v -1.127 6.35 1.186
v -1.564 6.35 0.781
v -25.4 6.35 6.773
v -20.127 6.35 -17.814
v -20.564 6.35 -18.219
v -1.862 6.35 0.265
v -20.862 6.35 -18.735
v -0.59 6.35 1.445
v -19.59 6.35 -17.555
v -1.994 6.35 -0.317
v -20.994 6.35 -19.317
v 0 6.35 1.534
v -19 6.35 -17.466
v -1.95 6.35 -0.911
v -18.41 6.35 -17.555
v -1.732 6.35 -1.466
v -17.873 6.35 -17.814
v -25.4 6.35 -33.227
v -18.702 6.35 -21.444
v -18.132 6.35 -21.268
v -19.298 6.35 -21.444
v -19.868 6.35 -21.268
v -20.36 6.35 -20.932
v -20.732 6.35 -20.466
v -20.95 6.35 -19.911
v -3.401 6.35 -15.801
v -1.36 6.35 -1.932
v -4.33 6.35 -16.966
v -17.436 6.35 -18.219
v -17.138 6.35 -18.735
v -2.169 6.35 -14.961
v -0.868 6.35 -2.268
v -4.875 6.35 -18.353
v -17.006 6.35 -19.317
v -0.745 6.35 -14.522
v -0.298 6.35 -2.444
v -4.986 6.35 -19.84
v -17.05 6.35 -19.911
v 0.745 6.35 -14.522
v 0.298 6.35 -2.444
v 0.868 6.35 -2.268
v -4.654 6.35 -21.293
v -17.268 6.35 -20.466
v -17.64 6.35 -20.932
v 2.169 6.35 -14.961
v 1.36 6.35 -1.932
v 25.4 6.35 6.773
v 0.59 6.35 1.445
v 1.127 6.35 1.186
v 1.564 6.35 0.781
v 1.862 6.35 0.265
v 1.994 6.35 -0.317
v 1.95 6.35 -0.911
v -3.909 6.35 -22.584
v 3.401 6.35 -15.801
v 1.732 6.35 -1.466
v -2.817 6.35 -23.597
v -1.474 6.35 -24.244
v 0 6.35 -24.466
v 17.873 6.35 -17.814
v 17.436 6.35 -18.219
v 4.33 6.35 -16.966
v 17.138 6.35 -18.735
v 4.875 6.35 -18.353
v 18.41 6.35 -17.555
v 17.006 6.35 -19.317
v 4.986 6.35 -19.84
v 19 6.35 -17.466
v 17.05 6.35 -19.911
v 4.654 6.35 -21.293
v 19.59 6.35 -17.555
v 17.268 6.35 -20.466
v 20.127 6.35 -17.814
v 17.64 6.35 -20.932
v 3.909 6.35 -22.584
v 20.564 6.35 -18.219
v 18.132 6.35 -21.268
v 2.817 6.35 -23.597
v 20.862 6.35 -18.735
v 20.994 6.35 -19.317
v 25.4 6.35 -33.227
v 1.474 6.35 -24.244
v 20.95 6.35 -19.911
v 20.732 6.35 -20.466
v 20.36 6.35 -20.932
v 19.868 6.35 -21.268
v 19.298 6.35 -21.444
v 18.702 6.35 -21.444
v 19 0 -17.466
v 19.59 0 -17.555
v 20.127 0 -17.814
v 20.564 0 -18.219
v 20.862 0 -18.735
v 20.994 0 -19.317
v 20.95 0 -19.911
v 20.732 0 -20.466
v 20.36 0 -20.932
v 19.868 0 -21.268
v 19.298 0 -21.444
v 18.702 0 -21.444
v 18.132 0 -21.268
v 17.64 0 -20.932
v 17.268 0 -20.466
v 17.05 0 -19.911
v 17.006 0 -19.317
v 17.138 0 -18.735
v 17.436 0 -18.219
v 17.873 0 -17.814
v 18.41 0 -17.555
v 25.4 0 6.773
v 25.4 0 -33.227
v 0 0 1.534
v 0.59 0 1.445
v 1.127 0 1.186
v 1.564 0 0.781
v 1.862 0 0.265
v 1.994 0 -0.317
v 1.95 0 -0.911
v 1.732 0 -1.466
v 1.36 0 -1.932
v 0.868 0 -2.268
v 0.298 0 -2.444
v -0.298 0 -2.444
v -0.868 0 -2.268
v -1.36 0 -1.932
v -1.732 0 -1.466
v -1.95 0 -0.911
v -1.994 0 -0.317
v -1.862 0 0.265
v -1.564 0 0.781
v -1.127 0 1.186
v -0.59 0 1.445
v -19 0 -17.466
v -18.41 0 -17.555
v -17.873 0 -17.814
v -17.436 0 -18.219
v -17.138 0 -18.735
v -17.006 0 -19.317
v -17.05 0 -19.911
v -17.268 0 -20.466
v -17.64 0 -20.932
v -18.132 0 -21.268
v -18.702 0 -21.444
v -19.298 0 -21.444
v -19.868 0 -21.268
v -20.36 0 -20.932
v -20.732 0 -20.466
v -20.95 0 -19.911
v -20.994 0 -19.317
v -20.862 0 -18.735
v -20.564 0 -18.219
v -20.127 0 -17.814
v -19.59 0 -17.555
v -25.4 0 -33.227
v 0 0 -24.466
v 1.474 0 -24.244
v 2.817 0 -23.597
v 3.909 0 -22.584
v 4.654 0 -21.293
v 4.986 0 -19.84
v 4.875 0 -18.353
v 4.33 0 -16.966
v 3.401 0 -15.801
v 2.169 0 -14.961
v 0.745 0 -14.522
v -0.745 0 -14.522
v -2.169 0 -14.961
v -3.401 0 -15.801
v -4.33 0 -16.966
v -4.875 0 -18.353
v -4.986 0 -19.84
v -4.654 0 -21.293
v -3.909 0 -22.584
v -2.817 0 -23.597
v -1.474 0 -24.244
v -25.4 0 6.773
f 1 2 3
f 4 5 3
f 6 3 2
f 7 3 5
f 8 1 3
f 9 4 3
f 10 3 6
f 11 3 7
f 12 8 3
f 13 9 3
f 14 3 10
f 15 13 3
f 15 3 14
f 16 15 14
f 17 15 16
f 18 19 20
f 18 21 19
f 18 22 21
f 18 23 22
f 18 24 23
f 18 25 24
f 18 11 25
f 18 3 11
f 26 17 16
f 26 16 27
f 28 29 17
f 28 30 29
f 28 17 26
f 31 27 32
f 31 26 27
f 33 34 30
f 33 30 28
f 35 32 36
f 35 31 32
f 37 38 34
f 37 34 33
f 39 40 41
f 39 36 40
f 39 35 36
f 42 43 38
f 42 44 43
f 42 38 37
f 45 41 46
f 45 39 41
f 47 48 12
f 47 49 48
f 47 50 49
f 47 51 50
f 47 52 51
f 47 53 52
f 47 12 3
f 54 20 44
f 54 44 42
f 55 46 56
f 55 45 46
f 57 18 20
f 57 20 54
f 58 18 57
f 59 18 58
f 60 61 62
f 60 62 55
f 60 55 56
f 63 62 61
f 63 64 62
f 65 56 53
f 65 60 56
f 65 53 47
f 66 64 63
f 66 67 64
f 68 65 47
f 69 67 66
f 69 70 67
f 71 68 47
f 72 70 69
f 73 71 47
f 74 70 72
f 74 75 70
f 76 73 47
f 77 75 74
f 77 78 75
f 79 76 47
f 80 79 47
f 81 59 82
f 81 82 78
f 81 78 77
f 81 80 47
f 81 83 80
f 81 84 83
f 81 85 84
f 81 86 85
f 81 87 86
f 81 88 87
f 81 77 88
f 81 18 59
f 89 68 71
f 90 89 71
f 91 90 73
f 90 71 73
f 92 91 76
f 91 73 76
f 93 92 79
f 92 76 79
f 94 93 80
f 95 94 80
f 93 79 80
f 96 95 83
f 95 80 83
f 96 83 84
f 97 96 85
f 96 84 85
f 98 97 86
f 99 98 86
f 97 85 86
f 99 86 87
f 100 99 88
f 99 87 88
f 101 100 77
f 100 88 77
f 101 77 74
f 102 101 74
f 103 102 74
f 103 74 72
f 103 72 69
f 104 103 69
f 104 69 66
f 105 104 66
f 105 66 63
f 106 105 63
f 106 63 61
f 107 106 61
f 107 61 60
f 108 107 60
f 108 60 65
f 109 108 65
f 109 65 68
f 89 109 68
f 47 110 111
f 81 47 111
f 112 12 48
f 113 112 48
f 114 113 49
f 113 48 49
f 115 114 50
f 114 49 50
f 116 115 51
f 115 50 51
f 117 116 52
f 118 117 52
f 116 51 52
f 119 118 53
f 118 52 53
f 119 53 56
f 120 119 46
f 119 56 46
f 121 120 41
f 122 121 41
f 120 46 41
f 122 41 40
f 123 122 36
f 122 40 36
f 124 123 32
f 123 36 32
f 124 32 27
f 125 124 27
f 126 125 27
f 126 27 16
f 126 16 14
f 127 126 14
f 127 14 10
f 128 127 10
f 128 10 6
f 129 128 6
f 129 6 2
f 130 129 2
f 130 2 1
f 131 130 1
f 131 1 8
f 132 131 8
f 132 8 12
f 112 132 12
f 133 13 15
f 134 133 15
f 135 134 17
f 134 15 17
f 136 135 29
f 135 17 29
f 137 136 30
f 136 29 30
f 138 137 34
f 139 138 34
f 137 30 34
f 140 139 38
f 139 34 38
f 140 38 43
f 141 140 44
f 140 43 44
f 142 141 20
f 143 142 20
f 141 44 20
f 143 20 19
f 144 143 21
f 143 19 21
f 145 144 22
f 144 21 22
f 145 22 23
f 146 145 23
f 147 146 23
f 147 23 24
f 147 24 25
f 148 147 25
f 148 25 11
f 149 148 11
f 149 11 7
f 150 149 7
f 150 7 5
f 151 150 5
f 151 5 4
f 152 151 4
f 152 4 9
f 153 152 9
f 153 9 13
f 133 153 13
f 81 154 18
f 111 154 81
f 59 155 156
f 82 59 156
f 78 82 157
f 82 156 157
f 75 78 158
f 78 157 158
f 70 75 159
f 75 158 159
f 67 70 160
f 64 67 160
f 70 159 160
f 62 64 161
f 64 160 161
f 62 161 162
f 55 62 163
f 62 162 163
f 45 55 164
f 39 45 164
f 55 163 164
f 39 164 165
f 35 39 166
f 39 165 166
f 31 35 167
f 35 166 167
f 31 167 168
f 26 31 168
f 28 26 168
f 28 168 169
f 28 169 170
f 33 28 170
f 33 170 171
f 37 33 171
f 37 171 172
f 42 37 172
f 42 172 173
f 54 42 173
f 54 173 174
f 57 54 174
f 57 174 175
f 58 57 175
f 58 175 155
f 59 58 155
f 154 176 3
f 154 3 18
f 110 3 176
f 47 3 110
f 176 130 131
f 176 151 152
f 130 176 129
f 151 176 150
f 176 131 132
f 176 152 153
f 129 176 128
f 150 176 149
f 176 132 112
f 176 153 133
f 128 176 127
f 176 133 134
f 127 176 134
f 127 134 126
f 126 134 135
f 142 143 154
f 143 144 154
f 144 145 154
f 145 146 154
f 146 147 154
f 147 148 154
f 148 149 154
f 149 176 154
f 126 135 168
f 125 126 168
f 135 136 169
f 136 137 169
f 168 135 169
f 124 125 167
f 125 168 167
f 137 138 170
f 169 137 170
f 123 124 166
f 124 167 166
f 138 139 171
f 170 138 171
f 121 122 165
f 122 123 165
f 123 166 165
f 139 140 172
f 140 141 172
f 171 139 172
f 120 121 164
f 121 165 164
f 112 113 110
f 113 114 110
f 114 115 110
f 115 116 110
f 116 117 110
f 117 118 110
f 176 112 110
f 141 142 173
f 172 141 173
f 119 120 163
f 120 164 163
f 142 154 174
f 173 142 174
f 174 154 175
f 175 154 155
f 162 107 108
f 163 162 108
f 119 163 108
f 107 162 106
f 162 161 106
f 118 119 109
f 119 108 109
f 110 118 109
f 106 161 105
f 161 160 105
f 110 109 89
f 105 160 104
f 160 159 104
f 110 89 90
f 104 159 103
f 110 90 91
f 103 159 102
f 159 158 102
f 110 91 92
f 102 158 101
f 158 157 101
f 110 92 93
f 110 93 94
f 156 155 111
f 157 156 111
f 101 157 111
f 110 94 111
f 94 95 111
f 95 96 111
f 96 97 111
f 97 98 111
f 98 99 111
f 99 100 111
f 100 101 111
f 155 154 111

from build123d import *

# Parameters (mm, degrees)
CROQUIS1_W              = 50.8
CROQUIS1_H              = 80
SALIENTE_EXTRUIR1_DEPTH = 6.35
CROQUIS4_R              = 2
CORTAR_EXTRUIR3_DEPTH   = 48.806720239
CROQUIS5_W              = 50.8
CROQUIS5_H              = 12.7
CORTAR_EXTRUIR4_DEPTH   = 48.806720239
CROQUIS6_W              = 50.8
CROQUIS6_H              = 20.526572449
CORTAR_EXTRUIR5_DEPTH   = 10
CROQUIS7_W              = 50.8
CROQUIS7_H              = 6.773427551
CORTAR_EXTRUIR6_DEPTH   = 10
CROQUIS9_R              = 5
CORTAR_EXTRUIR7_DEPTH   = 10


with BuildPart() as part:
    # Croquis1 → Saliente-Extruir1 (new body)
    with BuildSketch(Plane(origin=(0, 0, 0), x_dir=(1, 0, 0), z_dir=(0, 1, 0))):
        Rectangle(CROQUIS1_W, CROQUIS1_H)
    extrude(amount=SALIENTE_EXTRUIR1_DEPTH)

    # Croquis4 → Cortar-Extruir3 (cut, through all)
    with BuildSketch(Plane(origin=(0, 6.35, 0), x_dir=(1, 0, 0), z_dir=(0, 1, 0))):
        with Locations(Location((-19, 19.466091849, 0), (0, 0, 270))):
            Circle(CROQUIS4_R)
        with Locations(Location((19, 19.466091849, 0), (0, 0, 270))):
            Circle(CROQUIS4_R)
        with Locations(Location((0, 0.466091849, 0), (0, 0, 270))):
            Circle(CROQUIS4_R)
    extrude(amount=-CORTAR_EXTRUIR3_DEPTH, mode=Mode.SUBTRACT)

    # Croquis5 → Cortar-Extruir4 (cut, through all)
    with BuildSketch(Plane(origin=(0, 6.35, 0), x_dir=(1, 0, 0), z_dir=(0, 1, 0))):
        with Locations((0, -33.65)):
            Rectangle(CROQUIS5_W, CROQUIS5_H)
    extrude(amount=-CORTAR_EXTRUIR4_DEPTH, mode=Mode.SUBTRACT)

    # Croquis6 → Cortar-Extruir5 (cut)
    with BuildSketch(Plane(origin=(0, 6.35, 0), x_dir=(1, 0, 0), z_dir=(0, 1, 0))):
        with Locations((0, -17.036713776)):
            Rectangle(CROQUIS6_W, CROQUIS6_H)
    extrude(amount=-CORTAR_EXTRUIR5_DEPTH, mode=Mode.SUBTRACT)

    # Croquis7 → Cortar-Extruir6 (cut)
    with BuildSketch(Plane.XZ):
        with Locations((0, -36.613286225)):
            Rectangle(CROQUIS7_W, CROQUIS7_H)
    extrude(amount=-CORTAR_EXTRUIR6_DEPTH, mode=Mode.SUBTRACT)

    # Croquis9 → Cortar-Extruir7 (cut)
    with BuildSketch(Plane.XZ):
        with Locations(Location((0, -19.466091849, 0), (0, 0, 270))):
            Circle(CROQUIS9_R)
    extrude(amount=-CORTAR_EXTRUIR7_DEPTH, mode=Mode.SUBTRACT)


solid = part.part
